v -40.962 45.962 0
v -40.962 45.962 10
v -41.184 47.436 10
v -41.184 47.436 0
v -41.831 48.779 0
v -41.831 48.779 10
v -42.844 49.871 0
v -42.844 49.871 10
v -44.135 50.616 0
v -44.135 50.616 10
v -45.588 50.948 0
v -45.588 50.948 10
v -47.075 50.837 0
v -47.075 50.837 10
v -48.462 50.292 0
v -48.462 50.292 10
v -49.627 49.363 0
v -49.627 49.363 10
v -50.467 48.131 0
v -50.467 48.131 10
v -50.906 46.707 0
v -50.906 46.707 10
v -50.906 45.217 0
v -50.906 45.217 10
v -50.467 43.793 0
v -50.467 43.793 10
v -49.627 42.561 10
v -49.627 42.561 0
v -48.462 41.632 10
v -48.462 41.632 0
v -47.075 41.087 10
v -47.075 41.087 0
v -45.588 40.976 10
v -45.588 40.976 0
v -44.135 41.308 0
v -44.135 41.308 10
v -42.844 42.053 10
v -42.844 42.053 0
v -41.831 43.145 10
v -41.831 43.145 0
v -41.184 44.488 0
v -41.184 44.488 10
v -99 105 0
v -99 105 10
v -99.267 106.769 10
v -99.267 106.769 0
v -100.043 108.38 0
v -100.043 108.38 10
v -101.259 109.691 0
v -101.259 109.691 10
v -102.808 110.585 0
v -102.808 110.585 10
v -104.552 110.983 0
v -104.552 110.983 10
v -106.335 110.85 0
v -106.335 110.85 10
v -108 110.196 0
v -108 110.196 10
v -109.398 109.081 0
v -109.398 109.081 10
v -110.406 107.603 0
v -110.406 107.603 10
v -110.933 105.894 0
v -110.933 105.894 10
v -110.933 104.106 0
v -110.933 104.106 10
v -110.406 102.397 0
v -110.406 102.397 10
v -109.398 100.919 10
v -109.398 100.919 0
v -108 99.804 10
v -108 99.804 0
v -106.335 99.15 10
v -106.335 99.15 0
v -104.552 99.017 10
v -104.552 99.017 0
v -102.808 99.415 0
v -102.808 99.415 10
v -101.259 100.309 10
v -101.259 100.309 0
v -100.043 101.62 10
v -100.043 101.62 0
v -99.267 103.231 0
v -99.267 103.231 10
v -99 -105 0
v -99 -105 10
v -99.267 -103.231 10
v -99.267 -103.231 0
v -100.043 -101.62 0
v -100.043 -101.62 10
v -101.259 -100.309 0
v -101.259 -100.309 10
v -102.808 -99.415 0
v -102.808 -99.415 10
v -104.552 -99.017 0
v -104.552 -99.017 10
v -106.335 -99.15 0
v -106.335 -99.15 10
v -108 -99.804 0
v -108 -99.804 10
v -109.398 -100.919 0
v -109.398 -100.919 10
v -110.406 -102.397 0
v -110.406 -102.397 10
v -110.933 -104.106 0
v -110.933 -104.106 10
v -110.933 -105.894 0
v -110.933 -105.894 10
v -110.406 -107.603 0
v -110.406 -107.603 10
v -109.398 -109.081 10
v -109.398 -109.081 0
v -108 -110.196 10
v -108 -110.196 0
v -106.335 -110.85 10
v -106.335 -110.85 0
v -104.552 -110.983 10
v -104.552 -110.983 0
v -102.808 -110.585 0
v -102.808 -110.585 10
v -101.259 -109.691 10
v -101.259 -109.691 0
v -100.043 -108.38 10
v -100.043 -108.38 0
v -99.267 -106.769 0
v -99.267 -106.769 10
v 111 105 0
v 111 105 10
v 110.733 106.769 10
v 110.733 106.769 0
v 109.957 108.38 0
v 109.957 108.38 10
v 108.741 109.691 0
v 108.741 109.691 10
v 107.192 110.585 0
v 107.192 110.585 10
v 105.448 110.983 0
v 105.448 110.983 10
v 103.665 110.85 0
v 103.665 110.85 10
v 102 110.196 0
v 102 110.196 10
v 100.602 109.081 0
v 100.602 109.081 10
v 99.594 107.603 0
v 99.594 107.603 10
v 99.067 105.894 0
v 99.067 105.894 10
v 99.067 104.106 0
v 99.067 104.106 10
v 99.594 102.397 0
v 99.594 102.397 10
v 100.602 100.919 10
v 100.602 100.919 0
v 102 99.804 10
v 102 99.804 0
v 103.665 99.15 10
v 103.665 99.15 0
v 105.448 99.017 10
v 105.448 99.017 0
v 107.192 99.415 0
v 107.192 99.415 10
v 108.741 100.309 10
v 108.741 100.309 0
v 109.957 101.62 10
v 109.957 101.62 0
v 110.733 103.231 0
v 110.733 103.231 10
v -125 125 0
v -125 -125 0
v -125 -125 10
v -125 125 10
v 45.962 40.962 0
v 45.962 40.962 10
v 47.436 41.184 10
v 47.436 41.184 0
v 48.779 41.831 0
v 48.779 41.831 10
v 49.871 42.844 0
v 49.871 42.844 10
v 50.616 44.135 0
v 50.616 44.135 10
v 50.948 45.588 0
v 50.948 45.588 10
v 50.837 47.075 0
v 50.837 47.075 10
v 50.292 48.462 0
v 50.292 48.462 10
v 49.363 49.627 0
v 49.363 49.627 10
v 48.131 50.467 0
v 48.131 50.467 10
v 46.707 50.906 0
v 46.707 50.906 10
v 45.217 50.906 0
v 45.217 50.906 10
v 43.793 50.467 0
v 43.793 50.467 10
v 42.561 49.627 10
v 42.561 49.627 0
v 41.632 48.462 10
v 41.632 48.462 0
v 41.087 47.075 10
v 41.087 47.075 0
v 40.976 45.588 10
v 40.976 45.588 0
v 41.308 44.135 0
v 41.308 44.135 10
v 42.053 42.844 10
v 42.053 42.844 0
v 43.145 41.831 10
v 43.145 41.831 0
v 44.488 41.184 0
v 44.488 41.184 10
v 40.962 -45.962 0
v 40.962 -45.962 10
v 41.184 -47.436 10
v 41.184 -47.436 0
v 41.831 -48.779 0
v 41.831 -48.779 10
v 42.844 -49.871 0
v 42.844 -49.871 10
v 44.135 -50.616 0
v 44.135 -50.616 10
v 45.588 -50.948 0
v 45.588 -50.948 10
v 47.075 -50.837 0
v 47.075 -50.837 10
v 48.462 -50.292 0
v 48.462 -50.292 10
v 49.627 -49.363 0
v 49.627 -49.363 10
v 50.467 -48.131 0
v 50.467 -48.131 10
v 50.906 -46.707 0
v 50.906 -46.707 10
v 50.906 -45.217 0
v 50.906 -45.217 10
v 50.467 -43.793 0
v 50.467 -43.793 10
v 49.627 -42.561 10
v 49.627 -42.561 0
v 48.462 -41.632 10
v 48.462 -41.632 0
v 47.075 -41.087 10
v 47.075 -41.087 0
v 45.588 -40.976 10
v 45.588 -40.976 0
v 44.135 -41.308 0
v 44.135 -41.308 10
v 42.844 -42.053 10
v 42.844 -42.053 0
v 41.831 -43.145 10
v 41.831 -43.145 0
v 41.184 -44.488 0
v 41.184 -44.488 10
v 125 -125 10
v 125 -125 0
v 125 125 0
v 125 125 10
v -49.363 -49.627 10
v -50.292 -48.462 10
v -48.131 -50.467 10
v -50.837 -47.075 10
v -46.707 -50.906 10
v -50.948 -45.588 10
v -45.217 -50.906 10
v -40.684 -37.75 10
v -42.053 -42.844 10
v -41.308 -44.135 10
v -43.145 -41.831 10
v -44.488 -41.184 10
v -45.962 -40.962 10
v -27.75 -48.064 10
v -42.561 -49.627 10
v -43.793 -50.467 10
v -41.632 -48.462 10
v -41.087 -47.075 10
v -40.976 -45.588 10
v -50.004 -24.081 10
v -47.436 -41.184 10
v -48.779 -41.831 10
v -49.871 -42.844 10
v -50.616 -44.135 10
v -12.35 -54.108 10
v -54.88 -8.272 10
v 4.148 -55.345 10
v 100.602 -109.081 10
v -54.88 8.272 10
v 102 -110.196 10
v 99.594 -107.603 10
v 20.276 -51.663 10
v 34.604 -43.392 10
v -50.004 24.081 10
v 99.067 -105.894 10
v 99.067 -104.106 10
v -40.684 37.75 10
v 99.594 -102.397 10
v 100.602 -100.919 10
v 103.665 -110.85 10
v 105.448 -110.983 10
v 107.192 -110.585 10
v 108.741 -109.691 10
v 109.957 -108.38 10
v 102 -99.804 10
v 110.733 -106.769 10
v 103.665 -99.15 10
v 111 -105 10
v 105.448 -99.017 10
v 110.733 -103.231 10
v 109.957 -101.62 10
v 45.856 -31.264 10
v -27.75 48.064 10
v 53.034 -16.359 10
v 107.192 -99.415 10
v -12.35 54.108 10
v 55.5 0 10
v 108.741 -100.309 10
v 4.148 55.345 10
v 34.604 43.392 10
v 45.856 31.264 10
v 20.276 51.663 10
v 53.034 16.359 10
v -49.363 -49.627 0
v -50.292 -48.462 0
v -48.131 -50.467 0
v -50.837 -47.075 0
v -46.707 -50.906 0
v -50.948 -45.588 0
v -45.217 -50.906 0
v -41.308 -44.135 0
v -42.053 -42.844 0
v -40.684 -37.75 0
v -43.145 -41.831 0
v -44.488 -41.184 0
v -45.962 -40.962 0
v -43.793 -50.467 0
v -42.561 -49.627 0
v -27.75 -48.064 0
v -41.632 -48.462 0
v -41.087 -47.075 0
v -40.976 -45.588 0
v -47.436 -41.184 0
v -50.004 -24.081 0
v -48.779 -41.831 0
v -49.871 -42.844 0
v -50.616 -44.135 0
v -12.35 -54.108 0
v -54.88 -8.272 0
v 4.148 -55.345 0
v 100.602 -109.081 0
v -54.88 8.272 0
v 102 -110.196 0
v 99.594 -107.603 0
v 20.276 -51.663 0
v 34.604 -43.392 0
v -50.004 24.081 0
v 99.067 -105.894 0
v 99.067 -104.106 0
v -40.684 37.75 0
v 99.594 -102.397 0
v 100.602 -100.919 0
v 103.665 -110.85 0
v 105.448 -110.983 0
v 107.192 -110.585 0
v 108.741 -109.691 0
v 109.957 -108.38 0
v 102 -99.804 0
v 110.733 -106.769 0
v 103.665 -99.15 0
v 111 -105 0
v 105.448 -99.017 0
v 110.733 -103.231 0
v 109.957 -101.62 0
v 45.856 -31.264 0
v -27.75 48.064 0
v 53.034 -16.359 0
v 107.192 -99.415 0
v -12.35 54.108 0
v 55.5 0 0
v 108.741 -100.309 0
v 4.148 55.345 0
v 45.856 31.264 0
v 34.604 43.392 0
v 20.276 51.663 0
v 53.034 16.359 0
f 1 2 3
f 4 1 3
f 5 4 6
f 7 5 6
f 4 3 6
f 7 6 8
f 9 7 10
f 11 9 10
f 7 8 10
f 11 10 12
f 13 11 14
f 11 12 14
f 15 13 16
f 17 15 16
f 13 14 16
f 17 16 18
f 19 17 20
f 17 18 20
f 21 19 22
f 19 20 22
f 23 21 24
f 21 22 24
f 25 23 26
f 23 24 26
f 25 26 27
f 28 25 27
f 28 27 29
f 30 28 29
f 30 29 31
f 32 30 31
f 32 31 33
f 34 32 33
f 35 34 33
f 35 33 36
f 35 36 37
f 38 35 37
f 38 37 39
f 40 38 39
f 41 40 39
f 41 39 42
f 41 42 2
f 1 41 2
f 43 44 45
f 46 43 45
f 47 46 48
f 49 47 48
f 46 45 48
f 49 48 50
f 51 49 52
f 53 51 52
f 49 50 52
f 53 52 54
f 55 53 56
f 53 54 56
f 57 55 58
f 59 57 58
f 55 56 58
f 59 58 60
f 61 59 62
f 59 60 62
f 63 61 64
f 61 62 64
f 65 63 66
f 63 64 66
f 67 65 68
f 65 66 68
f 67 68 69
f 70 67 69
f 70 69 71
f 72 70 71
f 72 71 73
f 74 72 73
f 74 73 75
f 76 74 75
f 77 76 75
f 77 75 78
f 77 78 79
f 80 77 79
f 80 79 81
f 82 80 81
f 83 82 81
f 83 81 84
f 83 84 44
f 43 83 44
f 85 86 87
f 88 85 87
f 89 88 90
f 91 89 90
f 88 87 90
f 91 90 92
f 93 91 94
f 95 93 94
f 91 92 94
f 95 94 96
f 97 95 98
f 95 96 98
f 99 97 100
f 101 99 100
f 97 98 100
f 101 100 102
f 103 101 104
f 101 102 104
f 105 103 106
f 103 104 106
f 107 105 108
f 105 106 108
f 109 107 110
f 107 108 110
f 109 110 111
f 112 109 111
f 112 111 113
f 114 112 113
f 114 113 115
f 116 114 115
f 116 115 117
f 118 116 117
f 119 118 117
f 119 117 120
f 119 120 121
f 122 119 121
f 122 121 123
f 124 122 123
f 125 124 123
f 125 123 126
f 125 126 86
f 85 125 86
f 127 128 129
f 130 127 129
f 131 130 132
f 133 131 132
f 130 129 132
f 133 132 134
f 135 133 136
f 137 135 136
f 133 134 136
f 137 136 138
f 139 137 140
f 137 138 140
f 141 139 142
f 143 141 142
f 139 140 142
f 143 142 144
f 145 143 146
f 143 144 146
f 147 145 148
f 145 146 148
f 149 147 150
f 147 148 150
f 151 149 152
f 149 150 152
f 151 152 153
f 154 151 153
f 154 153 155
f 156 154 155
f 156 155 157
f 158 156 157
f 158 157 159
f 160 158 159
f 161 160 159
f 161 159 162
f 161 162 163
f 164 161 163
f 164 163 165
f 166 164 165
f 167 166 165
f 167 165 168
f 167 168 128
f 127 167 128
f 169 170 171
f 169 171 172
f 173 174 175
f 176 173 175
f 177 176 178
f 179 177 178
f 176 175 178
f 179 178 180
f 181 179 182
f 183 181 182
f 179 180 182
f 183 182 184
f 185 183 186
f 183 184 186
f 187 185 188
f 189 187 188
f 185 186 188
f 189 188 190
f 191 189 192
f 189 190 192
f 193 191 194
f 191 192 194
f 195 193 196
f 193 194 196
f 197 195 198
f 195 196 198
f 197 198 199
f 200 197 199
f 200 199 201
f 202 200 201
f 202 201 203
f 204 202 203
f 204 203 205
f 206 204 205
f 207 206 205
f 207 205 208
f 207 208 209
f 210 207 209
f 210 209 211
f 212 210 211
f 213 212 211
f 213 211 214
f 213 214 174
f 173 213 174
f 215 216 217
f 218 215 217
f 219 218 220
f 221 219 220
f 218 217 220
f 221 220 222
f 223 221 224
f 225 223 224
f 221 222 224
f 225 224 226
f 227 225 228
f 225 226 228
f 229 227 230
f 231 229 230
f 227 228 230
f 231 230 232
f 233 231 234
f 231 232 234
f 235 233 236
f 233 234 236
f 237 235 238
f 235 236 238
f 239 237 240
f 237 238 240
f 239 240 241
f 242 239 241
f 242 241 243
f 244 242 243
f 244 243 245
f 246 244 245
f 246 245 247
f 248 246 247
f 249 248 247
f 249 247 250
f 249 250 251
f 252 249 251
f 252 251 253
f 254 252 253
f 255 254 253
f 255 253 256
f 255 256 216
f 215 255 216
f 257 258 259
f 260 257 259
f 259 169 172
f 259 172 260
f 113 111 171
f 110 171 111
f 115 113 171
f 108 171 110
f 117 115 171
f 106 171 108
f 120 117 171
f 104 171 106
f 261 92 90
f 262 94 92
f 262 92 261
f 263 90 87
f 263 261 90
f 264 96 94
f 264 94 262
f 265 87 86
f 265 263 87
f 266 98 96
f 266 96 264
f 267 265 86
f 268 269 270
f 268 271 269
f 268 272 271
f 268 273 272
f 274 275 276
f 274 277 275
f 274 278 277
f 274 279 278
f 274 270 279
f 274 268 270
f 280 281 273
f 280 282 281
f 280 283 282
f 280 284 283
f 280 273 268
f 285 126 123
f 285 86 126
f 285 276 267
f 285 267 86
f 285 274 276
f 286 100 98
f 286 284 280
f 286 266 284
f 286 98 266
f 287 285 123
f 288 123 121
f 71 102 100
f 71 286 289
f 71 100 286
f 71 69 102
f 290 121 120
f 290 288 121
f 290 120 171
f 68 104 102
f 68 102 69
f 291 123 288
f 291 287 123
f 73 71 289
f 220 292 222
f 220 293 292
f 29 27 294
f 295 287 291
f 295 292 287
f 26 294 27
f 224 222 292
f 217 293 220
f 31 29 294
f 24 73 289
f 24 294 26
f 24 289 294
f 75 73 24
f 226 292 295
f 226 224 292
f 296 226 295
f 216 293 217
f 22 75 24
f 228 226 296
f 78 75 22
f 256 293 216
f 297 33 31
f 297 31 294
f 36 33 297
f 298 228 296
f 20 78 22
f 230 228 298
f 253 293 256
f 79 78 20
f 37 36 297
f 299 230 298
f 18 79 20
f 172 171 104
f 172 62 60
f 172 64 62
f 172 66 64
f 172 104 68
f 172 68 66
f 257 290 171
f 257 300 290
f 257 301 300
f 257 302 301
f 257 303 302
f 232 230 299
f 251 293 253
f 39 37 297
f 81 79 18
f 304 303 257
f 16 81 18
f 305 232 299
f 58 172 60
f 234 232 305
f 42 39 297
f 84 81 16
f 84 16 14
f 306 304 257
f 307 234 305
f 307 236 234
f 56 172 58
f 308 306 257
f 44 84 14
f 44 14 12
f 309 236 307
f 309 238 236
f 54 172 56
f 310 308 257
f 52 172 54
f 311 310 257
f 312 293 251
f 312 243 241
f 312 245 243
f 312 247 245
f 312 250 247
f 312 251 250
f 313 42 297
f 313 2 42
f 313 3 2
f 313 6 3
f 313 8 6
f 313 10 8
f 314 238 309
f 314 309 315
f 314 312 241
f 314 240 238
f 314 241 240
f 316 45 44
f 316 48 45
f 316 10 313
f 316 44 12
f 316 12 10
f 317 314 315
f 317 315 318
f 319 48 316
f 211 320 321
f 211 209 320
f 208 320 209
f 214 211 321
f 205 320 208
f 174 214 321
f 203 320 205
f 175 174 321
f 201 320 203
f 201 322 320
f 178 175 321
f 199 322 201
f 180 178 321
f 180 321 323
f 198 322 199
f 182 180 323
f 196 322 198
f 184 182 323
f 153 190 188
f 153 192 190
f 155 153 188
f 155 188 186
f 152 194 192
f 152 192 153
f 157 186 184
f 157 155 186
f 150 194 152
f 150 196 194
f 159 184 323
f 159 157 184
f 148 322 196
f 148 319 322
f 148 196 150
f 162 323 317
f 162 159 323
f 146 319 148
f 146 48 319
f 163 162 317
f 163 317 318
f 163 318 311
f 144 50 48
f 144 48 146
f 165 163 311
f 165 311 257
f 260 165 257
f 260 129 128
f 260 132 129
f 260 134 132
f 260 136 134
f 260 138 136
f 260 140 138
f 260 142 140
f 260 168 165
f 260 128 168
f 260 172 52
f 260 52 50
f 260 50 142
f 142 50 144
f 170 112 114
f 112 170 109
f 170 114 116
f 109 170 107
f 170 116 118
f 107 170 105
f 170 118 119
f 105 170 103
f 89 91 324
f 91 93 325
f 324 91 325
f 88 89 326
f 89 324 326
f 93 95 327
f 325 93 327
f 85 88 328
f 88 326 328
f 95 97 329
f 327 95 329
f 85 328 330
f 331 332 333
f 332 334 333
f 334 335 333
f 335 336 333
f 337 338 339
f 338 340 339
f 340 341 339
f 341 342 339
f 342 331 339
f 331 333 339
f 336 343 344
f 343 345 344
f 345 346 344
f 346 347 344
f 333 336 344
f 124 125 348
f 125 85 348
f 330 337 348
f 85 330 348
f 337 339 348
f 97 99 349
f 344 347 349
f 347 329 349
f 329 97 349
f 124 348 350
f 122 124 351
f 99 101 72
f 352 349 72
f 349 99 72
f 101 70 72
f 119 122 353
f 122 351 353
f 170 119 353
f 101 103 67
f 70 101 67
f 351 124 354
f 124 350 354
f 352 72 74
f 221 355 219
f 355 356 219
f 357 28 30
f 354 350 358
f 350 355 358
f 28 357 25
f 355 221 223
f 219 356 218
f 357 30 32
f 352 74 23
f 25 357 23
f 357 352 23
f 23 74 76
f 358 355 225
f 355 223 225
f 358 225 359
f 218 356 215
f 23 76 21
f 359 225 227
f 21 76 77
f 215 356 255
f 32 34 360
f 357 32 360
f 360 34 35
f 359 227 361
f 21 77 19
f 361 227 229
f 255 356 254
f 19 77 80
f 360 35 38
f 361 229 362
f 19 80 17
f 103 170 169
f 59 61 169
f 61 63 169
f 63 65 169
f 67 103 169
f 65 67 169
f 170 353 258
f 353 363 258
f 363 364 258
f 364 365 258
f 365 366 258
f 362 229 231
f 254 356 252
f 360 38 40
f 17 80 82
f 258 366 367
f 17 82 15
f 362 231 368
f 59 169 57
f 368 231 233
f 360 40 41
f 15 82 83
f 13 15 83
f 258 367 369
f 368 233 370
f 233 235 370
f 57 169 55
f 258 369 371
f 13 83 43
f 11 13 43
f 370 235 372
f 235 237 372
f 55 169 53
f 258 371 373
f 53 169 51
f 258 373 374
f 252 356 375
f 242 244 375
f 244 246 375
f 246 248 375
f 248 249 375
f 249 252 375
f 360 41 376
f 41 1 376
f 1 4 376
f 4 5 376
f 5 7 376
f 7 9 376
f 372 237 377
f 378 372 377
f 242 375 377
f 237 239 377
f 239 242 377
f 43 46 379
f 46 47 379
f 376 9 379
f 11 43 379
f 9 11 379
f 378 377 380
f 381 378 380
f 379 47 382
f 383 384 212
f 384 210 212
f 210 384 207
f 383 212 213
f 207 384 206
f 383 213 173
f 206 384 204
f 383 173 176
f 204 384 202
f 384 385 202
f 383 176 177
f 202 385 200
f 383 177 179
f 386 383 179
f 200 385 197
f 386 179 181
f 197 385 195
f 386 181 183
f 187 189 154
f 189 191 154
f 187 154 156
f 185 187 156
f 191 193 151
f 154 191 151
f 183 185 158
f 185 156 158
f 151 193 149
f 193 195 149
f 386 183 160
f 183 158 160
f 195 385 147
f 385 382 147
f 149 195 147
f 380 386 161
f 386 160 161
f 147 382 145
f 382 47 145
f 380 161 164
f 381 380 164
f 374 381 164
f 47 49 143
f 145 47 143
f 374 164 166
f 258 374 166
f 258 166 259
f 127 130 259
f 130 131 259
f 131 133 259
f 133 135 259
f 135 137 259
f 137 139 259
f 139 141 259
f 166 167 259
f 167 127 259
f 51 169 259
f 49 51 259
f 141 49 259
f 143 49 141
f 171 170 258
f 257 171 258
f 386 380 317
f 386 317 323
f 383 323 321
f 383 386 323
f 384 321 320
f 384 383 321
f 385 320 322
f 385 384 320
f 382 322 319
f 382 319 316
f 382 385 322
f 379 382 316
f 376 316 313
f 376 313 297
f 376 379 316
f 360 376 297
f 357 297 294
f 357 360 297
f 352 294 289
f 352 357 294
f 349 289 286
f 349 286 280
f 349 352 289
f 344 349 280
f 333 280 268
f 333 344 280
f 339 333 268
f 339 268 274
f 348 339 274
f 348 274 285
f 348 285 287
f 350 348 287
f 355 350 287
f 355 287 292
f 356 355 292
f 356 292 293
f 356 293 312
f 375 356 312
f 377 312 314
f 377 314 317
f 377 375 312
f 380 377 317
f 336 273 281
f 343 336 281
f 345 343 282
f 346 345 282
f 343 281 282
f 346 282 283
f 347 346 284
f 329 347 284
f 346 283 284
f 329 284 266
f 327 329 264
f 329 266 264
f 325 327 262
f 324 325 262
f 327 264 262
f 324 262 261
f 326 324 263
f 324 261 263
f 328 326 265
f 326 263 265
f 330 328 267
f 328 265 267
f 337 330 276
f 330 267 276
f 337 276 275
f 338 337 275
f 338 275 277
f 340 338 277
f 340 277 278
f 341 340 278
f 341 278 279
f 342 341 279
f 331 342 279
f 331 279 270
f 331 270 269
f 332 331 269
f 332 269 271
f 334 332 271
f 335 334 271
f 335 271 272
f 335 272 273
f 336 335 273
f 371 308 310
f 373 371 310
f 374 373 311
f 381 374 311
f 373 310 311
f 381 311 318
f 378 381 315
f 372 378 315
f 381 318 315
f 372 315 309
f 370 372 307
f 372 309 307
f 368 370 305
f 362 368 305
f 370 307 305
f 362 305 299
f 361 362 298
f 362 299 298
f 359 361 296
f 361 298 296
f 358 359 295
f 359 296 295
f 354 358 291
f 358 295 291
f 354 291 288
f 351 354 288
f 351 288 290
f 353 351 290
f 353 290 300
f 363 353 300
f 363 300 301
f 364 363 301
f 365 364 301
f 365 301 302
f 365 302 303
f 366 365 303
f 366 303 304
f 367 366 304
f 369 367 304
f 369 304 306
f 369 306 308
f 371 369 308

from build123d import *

# Parameters (mm, degrees)
F0_W            = 250
F0_H            = 250
F0_R            = 55.5
F1_DEPTH        = 10
F2_R            = 5
F3_DEPTH        = 25
F3_COPIES_COUNT = 4
F4_R            = 6
F5_DEPTH        = 10.001


# Not quite as in the source:
# - a pattern or mirror of a feature is missing from the dataset's text; its kind, count and spacing are read off the source's solid


with BuildPart() as f1:
    # F0 (on Top) → F1 (new body)
    with BuildSketch(Plane.XY):
        Rectangle(F0_W, F0_H)
        Circle(F0_R, mode=Mode.SUBTRACT)
    extrude(amount=F1_DEPTH)

    # F2 (on face) → F3 (cut)
    with BuildSketch(Plane.XY.offset(10)):
        with Locations((-45.9619407771, 45.9619407771)):
            Circle(F2_R)
    f3 = extrude(amount=-F3_DEPTH, mode=Mode.SUBTRACT)

    # F3_copies: F3 ×4 about axis
    f3_copies_axis = Axis((0, 0, 0), (0, 0, 1))
    for i in range(1, F3_COPIES_COUNT):
        add(f3.rotate(f3_copies_axis, i * 360 / F3_COPIES_COUNT), mode=Mode.SUBTRACT)

    # F4 (on face) → F5 (cut, through all)
    with BuildSketch(Plane.XY.offset(10)):
        with Locations((-105, 105)):
            Circle(F4_R)
        with Locations((105, 105)):
            Circle(F4_R)
        with Locations((105, -105)):
            Circle(F4_R)
        with Locations((-105, -105)):
            Circle(F4_R)
    extrude(amount=-F5_DEPTH, mode=Mode.SUBTRACT)


solid = f1.part
